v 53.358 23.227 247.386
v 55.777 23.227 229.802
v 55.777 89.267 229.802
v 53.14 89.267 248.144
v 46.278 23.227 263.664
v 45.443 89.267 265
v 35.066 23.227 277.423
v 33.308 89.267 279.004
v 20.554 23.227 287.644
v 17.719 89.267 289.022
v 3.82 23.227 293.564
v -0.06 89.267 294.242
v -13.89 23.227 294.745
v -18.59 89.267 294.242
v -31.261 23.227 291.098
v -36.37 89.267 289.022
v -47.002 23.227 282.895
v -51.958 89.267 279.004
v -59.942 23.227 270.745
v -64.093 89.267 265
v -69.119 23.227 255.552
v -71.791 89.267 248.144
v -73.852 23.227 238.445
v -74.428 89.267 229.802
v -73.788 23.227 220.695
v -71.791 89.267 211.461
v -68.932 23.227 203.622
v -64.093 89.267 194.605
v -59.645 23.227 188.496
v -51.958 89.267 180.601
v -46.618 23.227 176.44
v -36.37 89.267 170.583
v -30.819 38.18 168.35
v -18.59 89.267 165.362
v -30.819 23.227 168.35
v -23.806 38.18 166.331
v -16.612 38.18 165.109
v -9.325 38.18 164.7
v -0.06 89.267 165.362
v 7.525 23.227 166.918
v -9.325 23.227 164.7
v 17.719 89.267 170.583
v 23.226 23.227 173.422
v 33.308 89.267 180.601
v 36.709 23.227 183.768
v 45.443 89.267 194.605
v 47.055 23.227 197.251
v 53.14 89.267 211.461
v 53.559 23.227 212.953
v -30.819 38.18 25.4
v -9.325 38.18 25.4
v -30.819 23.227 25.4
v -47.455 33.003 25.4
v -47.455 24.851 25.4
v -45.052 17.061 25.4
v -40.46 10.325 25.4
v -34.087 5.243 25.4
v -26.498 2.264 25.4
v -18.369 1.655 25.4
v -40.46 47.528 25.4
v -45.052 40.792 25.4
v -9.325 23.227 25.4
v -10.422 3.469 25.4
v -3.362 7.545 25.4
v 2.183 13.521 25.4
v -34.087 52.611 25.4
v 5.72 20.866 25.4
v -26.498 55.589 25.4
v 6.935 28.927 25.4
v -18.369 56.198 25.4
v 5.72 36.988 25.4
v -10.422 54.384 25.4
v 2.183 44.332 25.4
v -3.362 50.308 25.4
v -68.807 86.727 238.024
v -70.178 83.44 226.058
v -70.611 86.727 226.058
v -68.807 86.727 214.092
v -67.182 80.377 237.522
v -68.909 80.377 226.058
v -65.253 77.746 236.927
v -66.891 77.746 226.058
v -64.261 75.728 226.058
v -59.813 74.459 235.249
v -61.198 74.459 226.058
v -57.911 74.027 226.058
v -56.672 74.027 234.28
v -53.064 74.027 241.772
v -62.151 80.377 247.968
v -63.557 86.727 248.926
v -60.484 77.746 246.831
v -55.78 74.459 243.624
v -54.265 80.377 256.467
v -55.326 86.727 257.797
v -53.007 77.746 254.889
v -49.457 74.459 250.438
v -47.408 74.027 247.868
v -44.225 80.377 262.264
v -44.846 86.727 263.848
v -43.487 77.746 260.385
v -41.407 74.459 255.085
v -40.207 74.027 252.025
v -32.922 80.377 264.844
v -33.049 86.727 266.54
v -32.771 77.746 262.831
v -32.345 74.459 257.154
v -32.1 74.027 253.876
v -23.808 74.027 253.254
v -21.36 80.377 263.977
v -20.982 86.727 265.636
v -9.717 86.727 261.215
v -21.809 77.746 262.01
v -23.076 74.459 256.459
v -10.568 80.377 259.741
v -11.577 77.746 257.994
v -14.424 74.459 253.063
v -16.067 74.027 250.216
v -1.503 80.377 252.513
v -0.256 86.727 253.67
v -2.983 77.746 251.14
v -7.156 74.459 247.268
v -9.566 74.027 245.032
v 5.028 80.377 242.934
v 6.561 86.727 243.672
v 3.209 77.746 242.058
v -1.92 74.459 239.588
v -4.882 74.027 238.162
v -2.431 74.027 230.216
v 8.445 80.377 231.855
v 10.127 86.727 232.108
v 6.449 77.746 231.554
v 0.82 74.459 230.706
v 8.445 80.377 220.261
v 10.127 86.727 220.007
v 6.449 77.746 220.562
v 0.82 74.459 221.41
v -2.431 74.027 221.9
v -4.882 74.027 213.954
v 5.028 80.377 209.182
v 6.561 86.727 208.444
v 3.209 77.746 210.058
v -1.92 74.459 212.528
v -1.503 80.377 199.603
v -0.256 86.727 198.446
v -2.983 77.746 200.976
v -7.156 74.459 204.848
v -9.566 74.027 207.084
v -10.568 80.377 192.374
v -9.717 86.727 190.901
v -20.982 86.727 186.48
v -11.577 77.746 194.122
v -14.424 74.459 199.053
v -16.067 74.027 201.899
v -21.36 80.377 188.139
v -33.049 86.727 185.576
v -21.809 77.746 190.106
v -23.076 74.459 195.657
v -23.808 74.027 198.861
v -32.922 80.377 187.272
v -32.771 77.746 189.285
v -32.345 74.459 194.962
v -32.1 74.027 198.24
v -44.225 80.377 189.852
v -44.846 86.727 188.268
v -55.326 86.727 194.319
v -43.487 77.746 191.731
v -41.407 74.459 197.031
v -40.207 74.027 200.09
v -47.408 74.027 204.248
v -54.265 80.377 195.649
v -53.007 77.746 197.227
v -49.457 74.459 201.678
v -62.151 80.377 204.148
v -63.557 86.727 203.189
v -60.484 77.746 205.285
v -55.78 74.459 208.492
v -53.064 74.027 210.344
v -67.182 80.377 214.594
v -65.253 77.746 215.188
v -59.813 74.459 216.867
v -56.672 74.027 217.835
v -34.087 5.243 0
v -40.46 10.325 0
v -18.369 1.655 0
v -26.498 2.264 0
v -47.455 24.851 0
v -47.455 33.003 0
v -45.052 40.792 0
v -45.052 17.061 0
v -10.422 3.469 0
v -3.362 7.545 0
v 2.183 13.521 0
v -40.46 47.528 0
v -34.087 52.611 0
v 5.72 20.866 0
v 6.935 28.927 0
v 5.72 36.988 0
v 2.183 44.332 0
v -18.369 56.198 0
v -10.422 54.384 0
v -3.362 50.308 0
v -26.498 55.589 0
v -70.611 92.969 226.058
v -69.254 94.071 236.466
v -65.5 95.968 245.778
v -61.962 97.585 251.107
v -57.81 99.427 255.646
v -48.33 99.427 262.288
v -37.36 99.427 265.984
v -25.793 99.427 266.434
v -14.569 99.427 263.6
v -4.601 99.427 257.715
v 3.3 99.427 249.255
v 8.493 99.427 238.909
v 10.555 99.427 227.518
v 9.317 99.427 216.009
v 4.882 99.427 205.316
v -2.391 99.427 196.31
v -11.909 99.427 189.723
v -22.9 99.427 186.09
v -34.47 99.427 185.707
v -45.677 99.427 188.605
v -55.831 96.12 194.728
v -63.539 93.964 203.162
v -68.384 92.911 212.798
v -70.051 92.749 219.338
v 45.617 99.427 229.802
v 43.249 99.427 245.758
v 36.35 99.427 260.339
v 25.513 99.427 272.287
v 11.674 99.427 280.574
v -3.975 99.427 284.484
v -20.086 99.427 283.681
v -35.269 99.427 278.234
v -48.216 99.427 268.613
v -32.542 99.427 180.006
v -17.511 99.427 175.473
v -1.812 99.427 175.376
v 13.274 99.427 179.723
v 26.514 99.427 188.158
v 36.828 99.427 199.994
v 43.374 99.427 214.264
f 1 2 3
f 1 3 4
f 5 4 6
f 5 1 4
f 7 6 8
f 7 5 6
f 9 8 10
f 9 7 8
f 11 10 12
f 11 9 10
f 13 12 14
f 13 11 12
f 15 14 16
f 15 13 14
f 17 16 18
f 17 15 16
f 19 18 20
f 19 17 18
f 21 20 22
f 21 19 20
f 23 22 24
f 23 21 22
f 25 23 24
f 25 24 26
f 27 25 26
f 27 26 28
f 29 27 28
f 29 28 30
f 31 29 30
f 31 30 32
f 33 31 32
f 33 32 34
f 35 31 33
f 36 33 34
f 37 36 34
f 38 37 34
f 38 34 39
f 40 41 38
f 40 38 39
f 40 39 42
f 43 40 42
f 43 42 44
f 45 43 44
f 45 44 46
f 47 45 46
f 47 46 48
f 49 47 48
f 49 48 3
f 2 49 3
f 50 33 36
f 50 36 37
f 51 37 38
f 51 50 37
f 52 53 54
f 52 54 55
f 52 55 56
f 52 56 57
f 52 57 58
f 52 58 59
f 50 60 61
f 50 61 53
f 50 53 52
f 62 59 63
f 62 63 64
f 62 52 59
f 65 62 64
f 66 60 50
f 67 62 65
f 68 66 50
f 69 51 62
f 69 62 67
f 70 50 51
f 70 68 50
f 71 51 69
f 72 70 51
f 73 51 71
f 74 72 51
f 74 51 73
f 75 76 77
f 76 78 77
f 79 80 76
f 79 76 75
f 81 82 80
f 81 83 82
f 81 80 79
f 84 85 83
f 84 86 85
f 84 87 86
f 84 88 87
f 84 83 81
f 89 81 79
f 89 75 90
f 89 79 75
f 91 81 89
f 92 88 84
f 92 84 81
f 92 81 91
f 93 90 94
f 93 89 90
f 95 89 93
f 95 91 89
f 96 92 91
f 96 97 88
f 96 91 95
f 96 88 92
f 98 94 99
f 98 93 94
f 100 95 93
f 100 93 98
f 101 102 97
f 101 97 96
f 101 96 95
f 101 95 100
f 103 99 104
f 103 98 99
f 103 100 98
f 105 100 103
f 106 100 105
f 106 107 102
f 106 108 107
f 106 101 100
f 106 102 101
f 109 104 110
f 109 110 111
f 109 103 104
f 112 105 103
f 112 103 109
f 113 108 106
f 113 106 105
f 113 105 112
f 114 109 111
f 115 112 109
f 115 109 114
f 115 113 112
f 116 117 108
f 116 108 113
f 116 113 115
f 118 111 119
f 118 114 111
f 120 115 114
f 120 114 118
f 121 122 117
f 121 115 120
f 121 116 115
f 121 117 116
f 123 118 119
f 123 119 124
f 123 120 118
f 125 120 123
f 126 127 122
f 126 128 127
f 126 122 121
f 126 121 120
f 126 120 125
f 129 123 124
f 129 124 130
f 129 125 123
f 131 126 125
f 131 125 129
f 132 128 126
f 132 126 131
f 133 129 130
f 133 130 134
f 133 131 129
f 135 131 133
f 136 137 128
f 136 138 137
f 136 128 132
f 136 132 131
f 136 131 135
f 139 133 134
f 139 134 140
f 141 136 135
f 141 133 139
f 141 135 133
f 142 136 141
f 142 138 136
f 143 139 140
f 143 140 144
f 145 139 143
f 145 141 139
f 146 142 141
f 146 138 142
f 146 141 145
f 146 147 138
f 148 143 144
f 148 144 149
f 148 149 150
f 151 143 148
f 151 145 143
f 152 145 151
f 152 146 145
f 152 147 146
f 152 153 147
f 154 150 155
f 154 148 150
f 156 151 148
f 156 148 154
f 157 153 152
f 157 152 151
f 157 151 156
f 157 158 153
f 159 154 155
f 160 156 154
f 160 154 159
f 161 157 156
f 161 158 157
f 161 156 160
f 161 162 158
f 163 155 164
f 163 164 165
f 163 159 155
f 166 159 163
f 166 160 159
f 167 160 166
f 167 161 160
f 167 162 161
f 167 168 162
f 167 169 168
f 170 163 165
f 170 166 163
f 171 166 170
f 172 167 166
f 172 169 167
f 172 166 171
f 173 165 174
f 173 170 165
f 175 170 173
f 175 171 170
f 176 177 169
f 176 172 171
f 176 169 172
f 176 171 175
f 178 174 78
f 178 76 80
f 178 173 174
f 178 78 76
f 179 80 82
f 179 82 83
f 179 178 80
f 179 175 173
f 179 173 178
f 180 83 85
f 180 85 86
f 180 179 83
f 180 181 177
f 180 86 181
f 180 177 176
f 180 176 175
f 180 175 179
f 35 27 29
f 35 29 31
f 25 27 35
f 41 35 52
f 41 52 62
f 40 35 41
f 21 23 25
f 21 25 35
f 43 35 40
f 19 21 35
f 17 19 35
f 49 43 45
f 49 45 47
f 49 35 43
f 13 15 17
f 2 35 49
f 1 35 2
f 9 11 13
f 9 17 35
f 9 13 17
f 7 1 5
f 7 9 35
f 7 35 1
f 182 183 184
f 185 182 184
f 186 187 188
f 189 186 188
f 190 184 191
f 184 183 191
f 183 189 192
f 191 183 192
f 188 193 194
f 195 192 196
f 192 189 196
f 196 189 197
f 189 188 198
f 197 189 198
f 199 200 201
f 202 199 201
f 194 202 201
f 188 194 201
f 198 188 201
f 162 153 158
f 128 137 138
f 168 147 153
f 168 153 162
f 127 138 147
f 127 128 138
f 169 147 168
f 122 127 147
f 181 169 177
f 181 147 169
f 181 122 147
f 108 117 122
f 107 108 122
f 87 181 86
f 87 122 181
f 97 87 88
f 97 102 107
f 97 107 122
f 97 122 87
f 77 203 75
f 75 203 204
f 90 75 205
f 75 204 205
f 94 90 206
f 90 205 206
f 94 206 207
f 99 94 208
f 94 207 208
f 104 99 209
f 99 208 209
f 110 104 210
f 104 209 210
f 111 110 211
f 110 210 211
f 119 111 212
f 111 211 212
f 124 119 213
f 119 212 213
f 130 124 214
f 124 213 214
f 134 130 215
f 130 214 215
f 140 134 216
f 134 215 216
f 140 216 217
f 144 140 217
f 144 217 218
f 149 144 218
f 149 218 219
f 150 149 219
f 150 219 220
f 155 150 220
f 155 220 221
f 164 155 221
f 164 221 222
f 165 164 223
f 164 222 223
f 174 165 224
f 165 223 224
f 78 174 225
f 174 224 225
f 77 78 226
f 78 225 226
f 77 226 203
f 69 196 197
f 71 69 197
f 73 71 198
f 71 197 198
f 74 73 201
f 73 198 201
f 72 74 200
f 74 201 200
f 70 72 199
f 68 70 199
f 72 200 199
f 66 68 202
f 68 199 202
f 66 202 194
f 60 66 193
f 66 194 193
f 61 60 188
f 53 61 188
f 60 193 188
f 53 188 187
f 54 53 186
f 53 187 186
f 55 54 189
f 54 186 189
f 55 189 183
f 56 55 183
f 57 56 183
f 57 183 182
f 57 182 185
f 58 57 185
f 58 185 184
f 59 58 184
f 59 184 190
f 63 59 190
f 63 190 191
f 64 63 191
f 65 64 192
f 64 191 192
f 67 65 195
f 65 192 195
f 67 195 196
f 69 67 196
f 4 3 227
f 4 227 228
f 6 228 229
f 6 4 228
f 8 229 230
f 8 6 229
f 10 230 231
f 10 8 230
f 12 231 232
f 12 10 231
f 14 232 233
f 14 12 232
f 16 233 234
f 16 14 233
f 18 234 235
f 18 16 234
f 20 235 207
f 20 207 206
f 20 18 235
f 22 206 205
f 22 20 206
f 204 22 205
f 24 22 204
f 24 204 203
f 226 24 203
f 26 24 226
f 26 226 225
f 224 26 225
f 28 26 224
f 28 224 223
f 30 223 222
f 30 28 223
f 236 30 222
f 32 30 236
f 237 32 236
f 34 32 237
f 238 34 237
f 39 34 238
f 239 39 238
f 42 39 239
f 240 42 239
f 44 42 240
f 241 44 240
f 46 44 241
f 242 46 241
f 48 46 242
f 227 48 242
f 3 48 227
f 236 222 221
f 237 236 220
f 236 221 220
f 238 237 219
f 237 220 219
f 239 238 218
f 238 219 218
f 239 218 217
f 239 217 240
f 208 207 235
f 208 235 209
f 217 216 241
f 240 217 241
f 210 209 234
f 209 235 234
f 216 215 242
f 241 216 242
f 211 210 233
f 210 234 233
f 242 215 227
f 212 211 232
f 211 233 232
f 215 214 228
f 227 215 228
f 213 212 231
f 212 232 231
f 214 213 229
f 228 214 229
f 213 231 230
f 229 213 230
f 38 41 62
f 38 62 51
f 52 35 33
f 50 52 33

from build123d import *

# Parameters (mm, degrees)
F0_R     = 27.3478618837
F1_DEPTH = 25.4
F2_W     = 21.4937683195
F2_H     = 14.953751117
F3_DEPTH = 228.6
F4_R     = 65.1026145731
F5_DEPTH = 76.2
F6_R     = 40.595906751
F7_DEPTH = 25.4
F8_R     = 12.7


# Not quite as in the source:
# - a fillet or chamfer that OpenCascade refuses, or shapes differently, is made with other operations: its cross-section is extruded or revolved along the edge and cut away or added


with BuildPart() as f1:
    # F0 (on Top) → F1 (new body)
    with BuildSketch(Plane.XY):
        with Locations((-20.4128082842, 28.926692903)):
            Circle(F0_R)
    extrude(amount=F1_DEPTH)

    # F2 (on face) → F3 (join)
    with BuildSketch(Plane.XY.offset(25.4)):
        with Locations((-20.0721742585, 30.7035986334)):
            Rectangle(F2_W, F2_H)
    extrude(amount=F3_DEPTH)

    # F4 (on face) → F5 (join)
    with BuildSketch(Plane.XZ.offset(-23.2267230749)):
        with Locations((-9.3252900988, 229.8023849726)):
            Circle(F4_R)
    extrude(amount=-F5_DEPTH)

    # F6 (on face) → F7 (cut)
    with BuildSketch(Plane(origin=(0, 99.4267230749, 0), x_dir=(-1, 0, 0), z_dir=(0, 1, 0))):
        with Locations((30.0150513649, 226.0579317808)):
            Circle(F6_R)
    extrude(amount=-F7_DEPTH, mode=Mode.SUBTRACT)

    # F8
    f8_edges = [f1.edges().sort_by_distance(p)[0] for p in [
        (10.580855, 74.026723, 226.057932),
    ]]
    fillet(f8_edges, radius=F8_R)

    # F9: chamfer of 10.16 on 1 edges, made by hand

    # F9_s1 → F9_t2 (revolve, cut)
    with BuildSketch(Plane.XY.offset(229.8023849726)):
        Polygon((45.6173244743, 99.4267230749), (55.7773244743, 89.2667230749), (55.7773244743, 99.4267230749), align=None)
    revolve(axis=Axis((-9.3252900988, 99.4267230749, 229.8023849726), (0, -1, 0)), mode=Mode.SUBTRACT)


solid = f1.part
